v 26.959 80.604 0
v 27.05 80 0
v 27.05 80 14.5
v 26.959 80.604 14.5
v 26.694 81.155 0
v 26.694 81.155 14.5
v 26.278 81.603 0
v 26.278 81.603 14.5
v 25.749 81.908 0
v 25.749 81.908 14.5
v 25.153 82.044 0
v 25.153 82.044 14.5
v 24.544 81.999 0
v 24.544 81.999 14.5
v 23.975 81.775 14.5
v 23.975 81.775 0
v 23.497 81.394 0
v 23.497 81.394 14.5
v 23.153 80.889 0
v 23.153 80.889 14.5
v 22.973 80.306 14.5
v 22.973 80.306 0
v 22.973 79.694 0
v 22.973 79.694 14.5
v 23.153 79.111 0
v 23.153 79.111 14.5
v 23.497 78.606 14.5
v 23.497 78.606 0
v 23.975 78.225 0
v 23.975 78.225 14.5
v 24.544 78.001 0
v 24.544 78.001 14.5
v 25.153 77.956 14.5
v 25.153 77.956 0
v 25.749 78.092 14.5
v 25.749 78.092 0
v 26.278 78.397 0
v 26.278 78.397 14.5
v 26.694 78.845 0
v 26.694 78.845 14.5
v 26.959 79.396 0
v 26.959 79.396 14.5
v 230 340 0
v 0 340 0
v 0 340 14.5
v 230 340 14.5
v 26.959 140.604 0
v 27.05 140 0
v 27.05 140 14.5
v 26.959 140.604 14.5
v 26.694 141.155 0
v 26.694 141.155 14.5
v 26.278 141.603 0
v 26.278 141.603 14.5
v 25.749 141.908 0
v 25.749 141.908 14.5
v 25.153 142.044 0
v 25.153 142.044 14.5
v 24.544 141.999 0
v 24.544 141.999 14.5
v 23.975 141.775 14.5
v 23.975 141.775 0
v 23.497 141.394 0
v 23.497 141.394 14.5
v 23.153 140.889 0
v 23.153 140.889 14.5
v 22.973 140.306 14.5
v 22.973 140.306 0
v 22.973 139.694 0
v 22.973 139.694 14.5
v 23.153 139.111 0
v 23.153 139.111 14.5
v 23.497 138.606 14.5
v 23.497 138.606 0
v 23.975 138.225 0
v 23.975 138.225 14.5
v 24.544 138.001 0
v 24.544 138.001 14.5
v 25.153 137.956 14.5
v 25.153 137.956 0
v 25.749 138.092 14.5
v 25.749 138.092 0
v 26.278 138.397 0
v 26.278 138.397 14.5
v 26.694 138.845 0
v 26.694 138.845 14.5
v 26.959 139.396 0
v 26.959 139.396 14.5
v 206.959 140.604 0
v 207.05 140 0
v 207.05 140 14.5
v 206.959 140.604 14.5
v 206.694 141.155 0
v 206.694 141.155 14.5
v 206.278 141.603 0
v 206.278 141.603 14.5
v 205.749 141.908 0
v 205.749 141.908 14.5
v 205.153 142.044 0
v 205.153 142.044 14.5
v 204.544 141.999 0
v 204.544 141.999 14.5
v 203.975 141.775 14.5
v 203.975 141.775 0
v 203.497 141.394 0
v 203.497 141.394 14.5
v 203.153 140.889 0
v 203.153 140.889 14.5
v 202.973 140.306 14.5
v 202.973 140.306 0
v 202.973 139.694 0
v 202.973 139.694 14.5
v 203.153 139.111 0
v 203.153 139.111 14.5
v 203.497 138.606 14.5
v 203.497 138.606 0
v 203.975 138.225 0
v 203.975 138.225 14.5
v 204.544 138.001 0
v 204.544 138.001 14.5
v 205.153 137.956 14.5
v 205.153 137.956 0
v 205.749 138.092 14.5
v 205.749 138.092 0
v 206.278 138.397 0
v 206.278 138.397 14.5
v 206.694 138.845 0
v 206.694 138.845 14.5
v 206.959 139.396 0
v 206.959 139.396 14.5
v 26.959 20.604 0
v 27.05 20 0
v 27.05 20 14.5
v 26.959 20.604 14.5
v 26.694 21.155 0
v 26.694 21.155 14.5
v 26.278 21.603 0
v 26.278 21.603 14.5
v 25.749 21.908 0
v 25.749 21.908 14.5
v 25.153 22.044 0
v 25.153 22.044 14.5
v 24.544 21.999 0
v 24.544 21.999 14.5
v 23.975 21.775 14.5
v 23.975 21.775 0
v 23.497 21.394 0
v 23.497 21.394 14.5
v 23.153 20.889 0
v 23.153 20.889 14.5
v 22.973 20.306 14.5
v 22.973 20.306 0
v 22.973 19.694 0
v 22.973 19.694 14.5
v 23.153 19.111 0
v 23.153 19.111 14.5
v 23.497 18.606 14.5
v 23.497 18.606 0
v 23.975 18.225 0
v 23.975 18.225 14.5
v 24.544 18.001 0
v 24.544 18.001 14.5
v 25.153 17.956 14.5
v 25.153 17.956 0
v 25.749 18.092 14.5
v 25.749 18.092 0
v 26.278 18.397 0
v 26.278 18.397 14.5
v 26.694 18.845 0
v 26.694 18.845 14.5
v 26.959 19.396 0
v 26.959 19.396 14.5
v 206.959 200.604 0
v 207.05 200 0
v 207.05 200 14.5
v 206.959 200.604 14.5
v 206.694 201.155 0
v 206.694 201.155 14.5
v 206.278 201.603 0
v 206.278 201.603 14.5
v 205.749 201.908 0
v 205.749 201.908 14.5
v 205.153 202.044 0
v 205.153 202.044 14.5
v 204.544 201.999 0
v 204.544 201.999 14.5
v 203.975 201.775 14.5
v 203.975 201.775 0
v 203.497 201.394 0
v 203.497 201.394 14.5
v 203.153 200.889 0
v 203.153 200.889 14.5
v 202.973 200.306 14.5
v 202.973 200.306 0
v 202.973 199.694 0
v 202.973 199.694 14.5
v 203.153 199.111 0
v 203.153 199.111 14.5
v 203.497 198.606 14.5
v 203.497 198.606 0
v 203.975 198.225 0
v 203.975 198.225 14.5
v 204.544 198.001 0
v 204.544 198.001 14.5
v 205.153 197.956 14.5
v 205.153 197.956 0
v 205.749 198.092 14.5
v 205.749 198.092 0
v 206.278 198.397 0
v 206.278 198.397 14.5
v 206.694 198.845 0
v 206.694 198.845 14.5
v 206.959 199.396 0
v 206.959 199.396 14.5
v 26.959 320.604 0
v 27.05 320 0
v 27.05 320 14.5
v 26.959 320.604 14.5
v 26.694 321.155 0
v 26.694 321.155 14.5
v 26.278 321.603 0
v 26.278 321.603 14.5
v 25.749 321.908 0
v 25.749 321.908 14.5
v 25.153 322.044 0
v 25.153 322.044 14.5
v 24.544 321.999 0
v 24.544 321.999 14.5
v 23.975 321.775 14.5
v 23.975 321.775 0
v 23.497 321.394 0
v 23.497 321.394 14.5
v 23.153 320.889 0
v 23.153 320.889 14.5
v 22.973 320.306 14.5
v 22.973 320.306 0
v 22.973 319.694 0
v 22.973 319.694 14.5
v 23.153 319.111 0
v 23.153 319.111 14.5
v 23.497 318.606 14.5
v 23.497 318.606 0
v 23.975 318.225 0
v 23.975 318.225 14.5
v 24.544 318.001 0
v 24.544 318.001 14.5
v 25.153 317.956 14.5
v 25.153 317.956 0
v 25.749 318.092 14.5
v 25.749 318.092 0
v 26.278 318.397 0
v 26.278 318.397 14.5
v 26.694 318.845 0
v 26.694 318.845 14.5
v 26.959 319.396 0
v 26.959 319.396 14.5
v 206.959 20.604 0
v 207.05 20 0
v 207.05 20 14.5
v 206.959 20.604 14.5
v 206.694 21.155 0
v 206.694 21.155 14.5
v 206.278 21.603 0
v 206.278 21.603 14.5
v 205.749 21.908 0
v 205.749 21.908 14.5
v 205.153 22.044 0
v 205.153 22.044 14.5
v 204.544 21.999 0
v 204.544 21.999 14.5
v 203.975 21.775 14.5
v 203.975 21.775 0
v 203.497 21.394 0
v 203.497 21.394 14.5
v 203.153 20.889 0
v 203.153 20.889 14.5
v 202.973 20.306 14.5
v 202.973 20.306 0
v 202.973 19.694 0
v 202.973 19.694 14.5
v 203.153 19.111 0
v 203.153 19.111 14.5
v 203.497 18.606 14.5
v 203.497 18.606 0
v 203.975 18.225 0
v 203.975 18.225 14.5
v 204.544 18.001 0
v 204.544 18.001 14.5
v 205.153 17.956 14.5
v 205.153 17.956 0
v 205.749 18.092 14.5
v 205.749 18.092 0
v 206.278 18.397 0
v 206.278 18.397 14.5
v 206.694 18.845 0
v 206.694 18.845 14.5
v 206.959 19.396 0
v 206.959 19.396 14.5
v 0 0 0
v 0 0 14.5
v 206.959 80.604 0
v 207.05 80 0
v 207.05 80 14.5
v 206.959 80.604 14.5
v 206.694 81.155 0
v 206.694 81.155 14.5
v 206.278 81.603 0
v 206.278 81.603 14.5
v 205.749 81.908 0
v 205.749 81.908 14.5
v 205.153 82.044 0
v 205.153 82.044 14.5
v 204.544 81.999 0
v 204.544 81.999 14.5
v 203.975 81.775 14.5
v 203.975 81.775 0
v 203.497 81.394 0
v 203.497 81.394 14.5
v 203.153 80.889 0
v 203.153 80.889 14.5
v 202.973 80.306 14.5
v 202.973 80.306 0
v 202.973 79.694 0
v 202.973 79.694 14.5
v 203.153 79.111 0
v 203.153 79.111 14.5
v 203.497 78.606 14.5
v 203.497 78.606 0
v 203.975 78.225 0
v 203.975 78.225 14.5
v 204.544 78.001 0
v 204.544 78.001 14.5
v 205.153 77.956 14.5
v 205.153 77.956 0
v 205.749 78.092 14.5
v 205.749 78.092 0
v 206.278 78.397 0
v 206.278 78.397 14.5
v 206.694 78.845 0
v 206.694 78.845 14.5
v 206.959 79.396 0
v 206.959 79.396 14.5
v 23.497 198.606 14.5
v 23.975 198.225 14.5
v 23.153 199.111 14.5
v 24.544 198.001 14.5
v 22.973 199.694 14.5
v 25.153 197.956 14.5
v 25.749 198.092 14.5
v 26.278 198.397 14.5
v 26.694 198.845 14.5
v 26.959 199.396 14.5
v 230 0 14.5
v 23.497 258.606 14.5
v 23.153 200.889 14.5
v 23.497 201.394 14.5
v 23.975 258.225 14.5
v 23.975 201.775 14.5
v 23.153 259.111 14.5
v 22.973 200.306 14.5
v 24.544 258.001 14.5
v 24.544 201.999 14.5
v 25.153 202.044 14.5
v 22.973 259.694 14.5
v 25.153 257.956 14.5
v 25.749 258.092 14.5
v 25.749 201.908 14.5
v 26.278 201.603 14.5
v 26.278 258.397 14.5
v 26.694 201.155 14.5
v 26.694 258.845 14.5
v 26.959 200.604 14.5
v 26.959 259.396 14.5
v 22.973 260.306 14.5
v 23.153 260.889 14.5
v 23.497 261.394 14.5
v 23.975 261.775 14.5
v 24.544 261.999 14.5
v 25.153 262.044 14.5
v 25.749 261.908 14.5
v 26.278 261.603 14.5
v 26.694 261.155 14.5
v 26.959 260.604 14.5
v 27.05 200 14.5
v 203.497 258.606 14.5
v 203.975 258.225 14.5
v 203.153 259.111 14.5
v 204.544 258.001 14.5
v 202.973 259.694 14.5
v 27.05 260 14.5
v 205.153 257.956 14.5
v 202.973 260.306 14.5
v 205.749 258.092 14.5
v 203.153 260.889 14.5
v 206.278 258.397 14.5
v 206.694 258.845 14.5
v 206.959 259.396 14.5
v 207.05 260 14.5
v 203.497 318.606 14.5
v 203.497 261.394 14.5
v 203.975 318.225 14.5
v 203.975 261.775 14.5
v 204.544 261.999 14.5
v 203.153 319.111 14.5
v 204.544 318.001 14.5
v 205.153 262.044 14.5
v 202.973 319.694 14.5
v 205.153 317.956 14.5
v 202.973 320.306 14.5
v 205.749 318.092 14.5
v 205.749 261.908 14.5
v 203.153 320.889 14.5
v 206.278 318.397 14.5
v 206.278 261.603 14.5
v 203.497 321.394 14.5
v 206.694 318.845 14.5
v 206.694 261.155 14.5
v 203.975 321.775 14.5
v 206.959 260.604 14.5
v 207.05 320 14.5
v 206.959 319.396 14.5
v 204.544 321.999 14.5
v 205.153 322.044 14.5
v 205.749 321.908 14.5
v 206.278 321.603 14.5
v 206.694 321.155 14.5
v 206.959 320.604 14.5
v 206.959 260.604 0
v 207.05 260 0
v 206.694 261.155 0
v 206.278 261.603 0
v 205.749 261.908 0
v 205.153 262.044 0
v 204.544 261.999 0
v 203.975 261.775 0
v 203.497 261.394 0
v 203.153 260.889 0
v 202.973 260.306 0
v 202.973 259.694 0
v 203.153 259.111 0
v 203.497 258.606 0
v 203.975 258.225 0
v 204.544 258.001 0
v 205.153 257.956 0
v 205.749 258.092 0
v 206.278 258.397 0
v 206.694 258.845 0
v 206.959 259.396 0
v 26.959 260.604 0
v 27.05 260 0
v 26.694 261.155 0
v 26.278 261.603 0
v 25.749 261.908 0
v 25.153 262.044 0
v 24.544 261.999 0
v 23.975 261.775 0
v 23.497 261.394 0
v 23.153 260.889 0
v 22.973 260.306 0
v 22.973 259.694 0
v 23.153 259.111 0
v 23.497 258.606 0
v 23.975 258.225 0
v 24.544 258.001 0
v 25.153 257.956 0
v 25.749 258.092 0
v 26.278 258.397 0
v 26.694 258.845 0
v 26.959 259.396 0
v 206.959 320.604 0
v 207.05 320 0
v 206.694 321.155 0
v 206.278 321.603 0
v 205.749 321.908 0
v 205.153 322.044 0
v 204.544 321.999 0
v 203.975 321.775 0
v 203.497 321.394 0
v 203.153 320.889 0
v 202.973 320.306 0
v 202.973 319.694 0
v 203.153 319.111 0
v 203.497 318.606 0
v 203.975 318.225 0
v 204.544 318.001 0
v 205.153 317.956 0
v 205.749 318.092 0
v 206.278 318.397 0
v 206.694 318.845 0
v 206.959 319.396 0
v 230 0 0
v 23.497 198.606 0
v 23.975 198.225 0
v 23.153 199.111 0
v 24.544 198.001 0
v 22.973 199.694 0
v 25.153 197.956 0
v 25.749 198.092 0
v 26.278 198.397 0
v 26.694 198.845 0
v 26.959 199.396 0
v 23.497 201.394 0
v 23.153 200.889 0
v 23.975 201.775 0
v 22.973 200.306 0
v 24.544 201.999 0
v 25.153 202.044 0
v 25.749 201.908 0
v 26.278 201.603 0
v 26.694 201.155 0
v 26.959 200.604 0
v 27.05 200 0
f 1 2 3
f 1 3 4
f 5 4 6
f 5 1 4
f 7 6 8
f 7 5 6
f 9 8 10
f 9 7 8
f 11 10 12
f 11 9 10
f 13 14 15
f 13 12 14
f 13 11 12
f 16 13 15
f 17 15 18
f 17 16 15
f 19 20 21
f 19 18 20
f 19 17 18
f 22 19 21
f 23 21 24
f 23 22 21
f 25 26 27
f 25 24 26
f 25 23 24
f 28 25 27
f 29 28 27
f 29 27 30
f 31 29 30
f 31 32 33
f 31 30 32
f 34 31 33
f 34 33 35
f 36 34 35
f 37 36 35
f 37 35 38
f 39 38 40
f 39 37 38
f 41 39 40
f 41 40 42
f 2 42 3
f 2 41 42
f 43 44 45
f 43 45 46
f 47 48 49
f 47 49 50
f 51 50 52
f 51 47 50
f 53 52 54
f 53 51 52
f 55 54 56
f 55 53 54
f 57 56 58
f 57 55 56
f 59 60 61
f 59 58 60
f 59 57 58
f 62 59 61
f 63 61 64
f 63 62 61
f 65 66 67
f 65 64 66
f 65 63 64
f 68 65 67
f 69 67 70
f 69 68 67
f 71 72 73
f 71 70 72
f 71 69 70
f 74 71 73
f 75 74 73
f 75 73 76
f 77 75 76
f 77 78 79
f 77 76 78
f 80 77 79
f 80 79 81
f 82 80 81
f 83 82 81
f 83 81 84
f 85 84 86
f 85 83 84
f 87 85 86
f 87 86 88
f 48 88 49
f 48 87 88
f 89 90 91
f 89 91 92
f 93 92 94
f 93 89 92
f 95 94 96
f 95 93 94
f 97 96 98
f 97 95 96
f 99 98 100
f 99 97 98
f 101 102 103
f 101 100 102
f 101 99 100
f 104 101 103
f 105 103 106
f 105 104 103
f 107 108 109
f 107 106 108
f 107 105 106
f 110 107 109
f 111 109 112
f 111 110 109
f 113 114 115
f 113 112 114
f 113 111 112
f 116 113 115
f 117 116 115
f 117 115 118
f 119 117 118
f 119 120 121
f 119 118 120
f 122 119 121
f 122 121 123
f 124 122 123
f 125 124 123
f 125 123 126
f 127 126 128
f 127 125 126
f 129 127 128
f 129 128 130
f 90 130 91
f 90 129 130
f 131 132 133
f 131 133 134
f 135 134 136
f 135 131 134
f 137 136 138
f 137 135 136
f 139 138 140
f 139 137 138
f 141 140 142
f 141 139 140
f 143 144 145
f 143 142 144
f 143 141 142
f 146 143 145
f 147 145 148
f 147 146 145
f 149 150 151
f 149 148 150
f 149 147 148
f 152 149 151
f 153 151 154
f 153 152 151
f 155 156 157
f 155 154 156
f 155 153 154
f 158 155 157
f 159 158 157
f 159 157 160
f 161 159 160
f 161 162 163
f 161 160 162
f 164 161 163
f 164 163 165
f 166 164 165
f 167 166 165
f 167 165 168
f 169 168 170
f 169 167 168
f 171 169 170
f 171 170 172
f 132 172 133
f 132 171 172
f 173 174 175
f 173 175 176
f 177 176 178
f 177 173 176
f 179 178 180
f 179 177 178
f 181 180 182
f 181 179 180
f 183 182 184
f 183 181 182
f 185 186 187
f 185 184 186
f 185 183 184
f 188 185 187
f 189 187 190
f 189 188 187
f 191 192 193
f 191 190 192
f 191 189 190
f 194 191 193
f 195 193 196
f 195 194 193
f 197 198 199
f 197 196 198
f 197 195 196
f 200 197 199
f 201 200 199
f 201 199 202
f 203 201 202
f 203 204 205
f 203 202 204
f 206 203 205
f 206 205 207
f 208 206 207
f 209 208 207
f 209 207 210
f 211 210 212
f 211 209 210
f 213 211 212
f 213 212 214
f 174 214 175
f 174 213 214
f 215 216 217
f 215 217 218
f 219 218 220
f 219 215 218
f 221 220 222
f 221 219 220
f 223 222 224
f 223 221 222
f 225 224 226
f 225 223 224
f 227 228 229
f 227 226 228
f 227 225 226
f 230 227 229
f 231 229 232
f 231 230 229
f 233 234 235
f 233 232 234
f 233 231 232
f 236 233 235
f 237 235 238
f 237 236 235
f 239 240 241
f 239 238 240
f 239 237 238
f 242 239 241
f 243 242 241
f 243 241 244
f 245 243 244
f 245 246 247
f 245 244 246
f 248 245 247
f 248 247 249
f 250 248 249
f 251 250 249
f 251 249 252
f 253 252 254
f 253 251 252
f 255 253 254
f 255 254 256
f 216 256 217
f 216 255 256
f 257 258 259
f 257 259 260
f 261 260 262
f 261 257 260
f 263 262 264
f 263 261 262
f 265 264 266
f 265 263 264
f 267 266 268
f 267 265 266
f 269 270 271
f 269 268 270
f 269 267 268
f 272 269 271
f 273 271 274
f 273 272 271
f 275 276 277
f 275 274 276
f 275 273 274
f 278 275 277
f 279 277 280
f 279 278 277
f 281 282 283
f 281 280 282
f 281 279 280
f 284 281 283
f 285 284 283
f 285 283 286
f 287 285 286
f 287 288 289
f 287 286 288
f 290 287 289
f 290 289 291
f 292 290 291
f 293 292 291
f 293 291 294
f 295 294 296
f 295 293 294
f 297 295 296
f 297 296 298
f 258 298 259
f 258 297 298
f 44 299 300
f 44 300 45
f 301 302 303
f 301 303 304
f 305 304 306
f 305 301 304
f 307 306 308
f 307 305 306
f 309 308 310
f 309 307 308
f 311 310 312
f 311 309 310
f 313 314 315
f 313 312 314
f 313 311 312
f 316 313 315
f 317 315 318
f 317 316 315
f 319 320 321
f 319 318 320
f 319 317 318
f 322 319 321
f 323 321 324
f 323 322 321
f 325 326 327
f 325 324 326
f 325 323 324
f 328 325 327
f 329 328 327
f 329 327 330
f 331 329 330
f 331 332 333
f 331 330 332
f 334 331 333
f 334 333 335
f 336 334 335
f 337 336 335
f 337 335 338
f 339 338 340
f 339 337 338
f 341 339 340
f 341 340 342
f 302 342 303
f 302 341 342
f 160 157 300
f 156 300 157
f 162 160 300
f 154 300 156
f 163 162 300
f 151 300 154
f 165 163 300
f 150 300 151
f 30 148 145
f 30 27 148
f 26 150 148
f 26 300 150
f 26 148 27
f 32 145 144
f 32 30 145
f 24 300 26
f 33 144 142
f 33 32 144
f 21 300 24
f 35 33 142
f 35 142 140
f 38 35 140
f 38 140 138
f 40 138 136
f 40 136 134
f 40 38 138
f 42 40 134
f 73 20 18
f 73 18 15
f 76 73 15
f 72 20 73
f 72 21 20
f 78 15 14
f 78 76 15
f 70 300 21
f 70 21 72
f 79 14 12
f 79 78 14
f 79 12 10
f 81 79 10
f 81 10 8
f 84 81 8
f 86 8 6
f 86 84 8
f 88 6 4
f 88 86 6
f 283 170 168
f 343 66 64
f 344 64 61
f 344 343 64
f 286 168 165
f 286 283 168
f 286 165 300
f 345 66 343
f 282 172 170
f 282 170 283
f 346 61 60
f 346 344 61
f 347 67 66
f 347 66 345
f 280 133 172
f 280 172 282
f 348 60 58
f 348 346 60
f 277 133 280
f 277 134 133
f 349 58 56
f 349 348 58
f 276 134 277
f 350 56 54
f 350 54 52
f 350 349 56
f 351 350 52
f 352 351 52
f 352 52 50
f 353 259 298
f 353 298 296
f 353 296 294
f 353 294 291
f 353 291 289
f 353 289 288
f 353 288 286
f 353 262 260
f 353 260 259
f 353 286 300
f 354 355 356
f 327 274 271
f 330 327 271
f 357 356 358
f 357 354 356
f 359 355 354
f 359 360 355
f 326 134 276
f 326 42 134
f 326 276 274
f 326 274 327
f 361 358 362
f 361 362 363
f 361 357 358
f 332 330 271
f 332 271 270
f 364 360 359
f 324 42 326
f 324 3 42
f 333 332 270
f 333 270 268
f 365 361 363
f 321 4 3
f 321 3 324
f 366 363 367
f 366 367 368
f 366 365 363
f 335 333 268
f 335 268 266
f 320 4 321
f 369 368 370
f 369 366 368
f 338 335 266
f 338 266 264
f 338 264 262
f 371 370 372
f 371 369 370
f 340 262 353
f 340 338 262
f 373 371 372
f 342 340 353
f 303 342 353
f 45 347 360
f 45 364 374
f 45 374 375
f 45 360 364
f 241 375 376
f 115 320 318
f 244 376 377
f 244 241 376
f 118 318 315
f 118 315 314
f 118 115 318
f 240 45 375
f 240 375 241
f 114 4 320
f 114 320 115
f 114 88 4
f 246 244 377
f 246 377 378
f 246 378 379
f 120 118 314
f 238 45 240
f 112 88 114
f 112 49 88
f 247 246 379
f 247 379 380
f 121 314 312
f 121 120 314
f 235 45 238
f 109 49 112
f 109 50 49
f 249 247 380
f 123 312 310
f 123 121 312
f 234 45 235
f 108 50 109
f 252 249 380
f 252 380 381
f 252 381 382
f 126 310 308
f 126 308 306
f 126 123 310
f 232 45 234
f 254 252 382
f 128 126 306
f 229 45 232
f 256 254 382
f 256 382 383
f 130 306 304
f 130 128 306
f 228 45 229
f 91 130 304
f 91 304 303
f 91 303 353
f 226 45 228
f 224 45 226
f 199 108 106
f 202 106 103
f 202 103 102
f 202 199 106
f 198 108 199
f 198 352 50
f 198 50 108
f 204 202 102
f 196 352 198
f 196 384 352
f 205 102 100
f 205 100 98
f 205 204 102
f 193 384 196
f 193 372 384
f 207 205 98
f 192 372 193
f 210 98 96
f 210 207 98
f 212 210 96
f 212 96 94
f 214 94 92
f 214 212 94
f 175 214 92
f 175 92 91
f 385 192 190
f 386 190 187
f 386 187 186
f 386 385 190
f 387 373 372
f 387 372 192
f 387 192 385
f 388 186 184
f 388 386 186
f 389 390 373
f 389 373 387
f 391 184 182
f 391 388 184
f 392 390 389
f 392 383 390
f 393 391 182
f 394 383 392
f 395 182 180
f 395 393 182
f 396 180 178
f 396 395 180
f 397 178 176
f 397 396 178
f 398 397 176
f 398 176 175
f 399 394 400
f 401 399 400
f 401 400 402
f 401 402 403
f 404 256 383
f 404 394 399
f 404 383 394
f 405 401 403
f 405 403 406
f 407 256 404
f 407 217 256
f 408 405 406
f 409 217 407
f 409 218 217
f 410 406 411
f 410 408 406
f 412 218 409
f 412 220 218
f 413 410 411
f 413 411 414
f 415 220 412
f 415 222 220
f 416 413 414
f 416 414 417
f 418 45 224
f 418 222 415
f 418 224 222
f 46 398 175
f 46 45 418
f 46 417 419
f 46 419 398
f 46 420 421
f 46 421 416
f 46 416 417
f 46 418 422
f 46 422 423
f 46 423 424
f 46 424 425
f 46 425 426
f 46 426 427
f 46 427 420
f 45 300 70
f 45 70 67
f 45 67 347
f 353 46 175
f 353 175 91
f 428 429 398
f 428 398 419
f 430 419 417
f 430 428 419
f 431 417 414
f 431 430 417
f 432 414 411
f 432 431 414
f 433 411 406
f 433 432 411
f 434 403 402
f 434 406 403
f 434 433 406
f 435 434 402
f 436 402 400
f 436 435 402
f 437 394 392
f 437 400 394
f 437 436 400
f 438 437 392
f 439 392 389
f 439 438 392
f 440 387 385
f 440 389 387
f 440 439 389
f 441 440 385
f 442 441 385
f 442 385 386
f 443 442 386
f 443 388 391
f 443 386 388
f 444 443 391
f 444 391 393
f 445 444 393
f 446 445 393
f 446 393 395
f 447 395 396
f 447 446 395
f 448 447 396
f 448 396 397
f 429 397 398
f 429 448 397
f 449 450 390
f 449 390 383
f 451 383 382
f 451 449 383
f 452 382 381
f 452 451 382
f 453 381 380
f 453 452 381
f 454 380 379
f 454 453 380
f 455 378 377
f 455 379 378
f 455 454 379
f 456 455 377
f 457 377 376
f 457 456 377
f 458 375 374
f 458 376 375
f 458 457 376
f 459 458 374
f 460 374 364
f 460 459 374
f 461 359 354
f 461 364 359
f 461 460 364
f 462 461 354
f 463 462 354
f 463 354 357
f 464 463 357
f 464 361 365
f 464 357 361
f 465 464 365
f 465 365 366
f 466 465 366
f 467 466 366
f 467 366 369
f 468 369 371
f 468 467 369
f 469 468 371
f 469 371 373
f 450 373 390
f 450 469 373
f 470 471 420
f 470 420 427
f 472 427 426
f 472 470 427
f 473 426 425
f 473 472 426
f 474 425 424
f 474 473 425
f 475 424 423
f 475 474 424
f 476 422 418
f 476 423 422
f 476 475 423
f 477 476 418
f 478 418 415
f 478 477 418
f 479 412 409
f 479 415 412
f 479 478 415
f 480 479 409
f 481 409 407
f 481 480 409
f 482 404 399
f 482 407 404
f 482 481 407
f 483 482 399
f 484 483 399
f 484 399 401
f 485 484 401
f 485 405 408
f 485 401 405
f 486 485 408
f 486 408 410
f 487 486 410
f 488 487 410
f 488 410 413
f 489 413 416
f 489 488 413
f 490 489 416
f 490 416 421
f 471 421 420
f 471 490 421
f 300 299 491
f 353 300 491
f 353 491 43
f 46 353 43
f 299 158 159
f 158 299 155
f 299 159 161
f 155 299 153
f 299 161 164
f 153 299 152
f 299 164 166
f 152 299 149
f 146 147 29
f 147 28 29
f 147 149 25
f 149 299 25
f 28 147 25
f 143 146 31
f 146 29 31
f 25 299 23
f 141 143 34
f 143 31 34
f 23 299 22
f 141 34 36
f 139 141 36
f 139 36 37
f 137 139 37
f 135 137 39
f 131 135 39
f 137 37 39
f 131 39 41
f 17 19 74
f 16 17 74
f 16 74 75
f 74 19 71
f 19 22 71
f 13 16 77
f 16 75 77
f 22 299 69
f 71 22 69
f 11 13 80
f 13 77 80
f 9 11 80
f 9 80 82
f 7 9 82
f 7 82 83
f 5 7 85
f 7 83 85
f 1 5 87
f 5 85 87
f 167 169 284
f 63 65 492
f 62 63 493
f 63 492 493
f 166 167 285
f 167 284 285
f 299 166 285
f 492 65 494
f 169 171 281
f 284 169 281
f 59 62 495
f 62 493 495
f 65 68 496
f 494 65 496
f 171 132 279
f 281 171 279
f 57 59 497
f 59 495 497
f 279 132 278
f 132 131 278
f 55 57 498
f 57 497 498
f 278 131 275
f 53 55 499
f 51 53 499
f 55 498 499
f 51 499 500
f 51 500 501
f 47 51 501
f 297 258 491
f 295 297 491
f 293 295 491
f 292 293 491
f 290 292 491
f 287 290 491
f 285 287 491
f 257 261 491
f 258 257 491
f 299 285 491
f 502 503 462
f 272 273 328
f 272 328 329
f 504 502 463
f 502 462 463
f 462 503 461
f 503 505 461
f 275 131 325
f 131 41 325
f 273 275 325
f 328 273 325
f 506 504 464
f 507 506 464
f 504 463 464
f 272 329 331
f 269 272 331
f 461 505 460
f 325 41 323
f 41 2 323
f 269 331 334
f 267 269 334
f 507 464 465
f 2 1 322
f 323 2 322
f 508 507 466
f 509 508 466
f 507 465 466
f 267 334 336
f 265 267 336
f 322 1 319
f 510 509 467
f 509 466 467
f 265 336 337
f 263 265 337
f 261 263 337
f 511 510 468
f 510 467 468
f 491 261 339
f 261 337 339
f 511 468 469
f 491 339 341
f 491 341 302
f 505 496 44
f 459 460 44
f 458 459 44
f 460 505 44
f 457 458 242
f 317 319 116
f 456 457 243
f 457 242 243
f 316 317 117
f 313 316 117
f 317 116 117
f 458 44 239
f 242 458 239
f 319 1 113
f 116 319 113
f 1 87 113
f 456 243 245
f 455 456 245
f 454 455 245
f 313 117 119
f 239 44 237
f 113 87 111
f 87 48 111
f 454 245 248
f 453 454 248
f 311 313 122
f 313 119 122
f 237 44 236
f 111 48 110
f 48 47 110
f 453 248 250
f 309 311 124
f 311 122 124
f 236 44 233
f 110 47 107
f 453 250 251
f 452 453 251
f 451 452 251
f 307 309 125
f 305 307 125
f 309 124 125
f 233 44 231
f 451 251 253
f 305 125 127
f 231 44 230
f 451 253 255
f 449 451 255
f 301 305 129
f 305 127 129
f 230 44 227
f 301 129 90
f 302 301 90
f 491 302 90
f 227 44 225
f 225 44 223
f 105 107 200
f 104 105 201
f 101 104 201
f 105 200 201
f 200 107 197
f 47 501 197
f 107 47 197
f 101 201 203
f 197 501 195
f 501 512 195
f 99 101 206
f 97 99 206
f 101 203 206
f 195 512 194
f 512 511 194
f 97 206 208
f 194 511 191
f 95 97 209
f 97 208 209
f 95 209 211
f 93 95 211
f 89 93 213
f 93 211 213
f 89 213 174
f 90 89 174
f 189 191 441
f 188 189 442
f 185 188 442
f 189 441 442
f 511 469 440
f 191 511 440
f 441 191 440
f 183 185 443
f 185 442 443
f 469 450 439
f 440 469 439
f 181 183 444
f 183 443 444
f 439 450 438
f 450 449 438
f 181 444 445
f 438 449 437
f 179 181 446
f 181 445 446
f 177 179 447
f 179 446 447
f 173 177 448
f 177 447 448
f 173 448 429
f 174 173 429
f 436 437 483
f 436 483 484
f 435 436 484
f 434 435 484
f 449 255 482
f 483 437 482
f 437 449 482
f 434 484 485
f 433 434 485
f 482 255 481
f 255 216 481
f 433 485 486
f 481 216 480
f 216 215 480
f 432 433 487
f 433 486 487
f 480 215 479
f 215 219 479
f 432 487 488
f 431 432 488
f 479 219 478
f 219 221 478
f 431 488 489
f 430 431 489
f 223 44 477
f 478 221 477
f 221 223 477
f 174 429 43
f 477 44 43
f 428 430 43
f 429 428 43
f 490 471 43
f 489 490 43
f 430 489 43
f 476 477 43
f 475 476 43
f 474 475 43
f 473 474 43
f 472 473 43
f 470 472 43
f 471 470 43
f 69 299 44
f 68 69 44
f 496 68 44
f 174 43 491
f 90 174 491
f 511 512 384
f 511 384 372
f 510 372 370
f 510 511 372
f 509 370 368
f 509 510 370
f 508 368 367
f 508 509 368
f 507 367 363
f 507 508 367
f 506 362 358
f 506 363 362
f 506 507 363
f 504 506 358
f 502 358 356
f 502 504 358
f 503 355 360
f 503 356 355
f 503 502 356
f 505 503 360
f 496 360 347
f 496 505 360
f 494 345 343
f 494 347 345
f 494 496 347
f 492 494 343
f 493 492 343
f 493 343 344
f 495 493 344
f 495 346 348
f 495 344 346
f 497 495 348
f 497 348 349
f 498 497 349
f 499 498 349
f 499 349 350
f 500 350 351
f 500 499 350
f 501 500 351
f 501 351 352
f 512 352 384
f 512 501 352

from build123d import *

# Parameters (mm, degrees)
ESQUISSE1_W                  = 230
ESQUISSE1_H                  = 340
BOSS_EXTRU_1_DEPTH           = 14.5
ENL_V_MAT_EXTRU_1_DEPTH      = 411.74353312
ENL_V_MAT_EXTRU_1_DEPTH_BACK = 411.74353312
ESQUISSE2_R                  = 2.05


with BuildPart() as part:
    # Esquisse1 → Boss.-Extru.1 (new body)
    with BuildSketch(Plane.XY):
        with Locations((115, 170)):
            Rectangle(ESQUISSE1_W, ESQUISSE1_H)
    extrude(amount=BOSS_EXTRU_1_DEPTH)

    # Esquisse2 → Enlèv. mat.-Extru.1 (cut, two sides: drawn at the far end of the back side and taken through both)
    with BuildSketch(Plane.XY.offset(14.5).offset(-ENL_V_MAT_EXTRU_1_DEPTH_BACK)):
        with Locations((25, 20)):
            Circle(ESQUISSE2_R)
        with Locations((25, 80)):
            Circle(ESQUISSE2_R)
        with Locations((25, 140)):
            Circle(ESQUISSE2_R)
        with Locations((25, 200)):
            Circle(ESQUISSE2_R)
        with Locations((25, 260)):
            Circle(ESQUISSE2_R)
        with Locations((25, 320)):
            Circle(ESQUISSE2_R)
        with Locations((205, 320)):
            Circle(ESQUISSE2_R)
        with Locations((205, 260)):
            Circle(ESQUISSE2_R)
        with Locations((205, 200)):
            Circle(ESQUISSE2_R)
        with Locations((205, 140)):
            Circle(ESQUISSE2_R)
        with Locations((205, 80)):
            Circle(ESQUISSE2_R)
        with Locations((205, 20)):
            Circle(ESQUISSE2_R)
    extrude(amount=ENL_V_MAT_EXTRU_1_DEPTH + ENL_V_MAT_EXTRU_1_DEPTH_BACK, mode=Mode.SUBTRACT)


solid = part.part
